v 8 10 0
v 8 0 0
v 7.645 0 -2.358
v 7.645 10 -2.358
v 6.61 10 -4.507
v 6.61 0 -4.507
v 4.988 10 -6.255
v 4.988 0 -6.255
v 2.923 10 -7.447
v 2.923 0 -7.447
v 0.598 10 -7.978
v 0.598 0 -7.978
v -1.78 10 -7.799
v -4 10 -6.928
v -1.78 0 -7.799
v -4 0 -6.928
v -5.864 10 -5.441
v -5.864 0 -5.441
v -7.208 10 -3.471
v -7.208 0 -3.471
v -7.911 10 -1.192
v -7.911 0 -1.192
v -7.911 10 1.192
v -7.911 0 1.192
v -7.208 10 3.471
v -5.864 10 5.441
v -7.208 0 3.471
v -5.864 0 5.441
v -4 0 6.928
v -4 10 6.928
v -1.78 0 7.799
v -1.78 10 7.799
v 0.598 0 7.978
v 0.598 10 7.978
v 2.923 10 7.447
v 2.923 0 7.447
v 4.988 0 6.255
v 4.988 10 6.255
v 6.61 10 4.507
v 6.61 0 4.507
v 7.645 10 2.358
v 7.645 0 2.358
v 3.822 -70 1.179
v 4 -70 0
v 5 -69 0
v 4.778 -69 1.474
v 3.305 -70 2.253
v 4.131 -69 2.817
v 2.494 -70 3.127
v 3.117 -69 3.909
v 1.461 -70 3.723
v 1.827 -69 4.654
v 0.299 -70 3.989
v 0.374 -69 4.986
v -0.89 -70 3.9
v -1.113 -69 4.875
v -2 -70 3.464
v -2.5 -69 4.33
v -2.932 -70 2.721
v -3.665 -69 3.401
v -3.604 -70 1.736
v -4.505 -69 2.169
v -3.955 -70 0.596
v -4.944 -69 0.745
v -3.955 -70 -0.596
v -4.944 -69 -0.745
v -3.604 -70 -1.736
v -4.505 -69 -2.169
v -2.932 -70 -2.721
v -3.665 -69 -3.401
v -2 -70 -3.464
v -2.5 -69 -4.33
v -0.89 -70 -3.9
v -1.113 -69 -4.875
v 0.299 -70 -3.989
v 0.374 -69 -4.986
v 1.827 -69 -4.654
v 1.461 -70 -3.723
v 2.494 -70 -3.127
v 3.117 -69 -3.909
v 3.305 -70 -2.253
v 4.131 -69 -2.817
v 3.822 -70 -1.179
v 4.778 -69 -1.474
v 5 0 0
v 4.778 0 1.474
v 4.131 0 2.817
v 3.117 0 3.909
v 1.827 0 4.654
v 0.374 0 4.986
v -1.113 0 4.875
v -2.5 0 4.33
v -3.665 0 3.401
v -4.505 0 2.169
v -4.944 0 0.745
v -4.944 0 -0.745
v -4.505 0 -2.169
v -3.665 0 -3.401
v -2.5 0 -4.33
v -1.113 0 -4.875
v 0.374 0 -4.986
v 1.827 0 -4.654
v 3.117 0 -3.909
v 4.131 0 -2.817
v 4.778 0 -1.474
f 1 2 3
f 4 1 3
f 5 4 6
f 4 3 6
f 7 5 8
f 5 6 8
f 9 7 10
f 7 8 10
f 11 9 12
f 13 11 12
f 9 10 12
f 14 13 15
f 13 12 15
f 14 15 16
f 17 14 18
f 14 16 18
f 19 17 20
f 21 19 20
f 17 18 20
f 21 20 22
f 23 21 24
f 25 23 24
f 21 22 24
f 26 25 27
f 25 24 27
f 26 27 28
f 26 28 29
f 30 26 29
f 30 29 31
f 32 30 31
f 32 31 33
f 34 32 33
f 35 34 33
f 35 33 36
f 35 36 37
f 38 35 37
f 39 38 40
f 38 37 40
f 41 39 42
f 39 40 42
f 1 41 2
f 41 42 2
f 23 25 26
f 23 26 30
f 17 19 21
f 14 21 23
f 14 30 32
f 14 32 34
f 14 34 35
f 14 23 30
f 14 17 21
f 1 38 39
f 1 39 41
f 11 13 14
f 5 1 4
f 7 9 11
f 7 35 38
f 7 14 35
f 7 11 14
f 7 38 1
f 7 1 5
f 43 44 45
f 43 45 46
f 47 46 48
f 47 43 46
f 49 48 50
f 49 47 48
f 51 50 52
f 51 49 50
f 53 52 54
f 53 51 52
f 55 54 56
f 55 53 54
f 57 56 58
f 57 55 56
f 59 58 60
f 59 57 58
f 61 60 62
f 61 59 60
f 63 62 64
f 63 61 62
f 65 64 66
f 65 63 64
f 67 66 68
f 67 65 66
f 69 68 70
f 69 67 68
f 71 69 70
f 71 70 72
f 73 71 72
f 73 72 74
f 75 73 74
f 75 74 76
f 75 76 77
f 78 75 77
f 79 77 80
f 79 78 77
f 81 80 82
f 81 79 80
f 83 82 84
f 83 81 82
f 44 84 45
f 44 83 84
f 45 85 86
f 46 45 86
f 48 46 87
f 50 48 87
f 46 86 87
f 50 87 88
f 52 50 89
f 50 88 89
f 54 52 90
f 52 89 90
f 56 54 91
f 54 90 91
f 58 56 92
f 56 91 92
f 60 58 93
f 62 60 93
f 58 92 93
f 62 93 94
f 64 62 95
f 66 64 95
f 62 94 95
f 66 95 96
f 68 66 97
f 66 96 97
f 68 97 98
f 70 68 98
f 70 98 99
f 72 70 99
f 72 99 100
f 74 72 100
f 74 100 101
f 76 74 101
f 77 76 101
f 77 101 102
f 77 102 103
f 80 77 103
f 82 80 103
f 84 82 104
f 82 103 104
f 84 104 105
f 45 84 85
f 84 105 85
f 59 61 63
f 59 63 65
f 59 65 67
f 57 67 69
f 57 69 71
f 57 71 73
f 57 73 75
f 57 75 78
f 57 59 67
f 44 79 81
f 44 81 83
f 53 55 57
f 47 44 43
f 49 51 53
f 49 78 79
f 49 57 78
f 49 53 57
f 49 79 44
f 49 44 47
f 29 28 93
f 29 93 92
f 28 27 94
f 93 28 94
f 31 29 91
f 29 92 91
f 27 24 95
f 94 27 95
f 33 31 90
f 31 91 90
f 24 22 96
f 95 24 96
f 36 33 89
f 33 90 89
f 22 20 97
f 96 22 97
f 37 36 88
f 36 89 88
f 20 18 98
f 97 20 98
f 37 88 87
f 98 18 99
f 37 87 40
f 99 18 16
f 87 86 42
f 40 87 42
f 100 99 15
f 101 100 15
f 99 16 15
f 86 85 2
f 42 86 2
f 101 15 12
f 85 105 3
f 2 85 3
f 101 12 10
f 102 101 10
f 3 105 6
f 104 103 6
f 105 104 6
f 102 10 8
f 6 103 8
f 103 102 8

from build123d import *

# Parameters (mm, degrees)
SKETCH1_R           = 8
BOSS_EXTRUDE1_DEPTH = 10
SKETCH2_R           = 5
BOSS_EXTRUDE2_DEPTH = 70
CHAMFER1_SIZE       = 1


with BuildPart() as part:
    # Sketch1 → Boss-Extrude1 (new body)
    with BuildSketch(Plane(origin=(0, 0, 0), x_dir=(1, 0, 0), z_dir=(0, 1, 0))):
        Circle(SKETCH1_R)
    extrude(amount=BOSS_EXTRUDE1_DEPTH)

    # Sketch2 → Boss-Extrude2 (add)
    with BuildSketch(Plane.XZ):
        Circle(SKETCH2_R)
    extrude(amount=BOSS_EXTRUDE2_DEPTH)

    # Chamfer1
    chamfer1_edges = [part.edges().sort_by_distance(p)[0] for p in [
        (-5, -70, 0),
    ]]
    chamfer(chamfer1_edges, length=CHAMFER1_SIZE)


solid = part.part
